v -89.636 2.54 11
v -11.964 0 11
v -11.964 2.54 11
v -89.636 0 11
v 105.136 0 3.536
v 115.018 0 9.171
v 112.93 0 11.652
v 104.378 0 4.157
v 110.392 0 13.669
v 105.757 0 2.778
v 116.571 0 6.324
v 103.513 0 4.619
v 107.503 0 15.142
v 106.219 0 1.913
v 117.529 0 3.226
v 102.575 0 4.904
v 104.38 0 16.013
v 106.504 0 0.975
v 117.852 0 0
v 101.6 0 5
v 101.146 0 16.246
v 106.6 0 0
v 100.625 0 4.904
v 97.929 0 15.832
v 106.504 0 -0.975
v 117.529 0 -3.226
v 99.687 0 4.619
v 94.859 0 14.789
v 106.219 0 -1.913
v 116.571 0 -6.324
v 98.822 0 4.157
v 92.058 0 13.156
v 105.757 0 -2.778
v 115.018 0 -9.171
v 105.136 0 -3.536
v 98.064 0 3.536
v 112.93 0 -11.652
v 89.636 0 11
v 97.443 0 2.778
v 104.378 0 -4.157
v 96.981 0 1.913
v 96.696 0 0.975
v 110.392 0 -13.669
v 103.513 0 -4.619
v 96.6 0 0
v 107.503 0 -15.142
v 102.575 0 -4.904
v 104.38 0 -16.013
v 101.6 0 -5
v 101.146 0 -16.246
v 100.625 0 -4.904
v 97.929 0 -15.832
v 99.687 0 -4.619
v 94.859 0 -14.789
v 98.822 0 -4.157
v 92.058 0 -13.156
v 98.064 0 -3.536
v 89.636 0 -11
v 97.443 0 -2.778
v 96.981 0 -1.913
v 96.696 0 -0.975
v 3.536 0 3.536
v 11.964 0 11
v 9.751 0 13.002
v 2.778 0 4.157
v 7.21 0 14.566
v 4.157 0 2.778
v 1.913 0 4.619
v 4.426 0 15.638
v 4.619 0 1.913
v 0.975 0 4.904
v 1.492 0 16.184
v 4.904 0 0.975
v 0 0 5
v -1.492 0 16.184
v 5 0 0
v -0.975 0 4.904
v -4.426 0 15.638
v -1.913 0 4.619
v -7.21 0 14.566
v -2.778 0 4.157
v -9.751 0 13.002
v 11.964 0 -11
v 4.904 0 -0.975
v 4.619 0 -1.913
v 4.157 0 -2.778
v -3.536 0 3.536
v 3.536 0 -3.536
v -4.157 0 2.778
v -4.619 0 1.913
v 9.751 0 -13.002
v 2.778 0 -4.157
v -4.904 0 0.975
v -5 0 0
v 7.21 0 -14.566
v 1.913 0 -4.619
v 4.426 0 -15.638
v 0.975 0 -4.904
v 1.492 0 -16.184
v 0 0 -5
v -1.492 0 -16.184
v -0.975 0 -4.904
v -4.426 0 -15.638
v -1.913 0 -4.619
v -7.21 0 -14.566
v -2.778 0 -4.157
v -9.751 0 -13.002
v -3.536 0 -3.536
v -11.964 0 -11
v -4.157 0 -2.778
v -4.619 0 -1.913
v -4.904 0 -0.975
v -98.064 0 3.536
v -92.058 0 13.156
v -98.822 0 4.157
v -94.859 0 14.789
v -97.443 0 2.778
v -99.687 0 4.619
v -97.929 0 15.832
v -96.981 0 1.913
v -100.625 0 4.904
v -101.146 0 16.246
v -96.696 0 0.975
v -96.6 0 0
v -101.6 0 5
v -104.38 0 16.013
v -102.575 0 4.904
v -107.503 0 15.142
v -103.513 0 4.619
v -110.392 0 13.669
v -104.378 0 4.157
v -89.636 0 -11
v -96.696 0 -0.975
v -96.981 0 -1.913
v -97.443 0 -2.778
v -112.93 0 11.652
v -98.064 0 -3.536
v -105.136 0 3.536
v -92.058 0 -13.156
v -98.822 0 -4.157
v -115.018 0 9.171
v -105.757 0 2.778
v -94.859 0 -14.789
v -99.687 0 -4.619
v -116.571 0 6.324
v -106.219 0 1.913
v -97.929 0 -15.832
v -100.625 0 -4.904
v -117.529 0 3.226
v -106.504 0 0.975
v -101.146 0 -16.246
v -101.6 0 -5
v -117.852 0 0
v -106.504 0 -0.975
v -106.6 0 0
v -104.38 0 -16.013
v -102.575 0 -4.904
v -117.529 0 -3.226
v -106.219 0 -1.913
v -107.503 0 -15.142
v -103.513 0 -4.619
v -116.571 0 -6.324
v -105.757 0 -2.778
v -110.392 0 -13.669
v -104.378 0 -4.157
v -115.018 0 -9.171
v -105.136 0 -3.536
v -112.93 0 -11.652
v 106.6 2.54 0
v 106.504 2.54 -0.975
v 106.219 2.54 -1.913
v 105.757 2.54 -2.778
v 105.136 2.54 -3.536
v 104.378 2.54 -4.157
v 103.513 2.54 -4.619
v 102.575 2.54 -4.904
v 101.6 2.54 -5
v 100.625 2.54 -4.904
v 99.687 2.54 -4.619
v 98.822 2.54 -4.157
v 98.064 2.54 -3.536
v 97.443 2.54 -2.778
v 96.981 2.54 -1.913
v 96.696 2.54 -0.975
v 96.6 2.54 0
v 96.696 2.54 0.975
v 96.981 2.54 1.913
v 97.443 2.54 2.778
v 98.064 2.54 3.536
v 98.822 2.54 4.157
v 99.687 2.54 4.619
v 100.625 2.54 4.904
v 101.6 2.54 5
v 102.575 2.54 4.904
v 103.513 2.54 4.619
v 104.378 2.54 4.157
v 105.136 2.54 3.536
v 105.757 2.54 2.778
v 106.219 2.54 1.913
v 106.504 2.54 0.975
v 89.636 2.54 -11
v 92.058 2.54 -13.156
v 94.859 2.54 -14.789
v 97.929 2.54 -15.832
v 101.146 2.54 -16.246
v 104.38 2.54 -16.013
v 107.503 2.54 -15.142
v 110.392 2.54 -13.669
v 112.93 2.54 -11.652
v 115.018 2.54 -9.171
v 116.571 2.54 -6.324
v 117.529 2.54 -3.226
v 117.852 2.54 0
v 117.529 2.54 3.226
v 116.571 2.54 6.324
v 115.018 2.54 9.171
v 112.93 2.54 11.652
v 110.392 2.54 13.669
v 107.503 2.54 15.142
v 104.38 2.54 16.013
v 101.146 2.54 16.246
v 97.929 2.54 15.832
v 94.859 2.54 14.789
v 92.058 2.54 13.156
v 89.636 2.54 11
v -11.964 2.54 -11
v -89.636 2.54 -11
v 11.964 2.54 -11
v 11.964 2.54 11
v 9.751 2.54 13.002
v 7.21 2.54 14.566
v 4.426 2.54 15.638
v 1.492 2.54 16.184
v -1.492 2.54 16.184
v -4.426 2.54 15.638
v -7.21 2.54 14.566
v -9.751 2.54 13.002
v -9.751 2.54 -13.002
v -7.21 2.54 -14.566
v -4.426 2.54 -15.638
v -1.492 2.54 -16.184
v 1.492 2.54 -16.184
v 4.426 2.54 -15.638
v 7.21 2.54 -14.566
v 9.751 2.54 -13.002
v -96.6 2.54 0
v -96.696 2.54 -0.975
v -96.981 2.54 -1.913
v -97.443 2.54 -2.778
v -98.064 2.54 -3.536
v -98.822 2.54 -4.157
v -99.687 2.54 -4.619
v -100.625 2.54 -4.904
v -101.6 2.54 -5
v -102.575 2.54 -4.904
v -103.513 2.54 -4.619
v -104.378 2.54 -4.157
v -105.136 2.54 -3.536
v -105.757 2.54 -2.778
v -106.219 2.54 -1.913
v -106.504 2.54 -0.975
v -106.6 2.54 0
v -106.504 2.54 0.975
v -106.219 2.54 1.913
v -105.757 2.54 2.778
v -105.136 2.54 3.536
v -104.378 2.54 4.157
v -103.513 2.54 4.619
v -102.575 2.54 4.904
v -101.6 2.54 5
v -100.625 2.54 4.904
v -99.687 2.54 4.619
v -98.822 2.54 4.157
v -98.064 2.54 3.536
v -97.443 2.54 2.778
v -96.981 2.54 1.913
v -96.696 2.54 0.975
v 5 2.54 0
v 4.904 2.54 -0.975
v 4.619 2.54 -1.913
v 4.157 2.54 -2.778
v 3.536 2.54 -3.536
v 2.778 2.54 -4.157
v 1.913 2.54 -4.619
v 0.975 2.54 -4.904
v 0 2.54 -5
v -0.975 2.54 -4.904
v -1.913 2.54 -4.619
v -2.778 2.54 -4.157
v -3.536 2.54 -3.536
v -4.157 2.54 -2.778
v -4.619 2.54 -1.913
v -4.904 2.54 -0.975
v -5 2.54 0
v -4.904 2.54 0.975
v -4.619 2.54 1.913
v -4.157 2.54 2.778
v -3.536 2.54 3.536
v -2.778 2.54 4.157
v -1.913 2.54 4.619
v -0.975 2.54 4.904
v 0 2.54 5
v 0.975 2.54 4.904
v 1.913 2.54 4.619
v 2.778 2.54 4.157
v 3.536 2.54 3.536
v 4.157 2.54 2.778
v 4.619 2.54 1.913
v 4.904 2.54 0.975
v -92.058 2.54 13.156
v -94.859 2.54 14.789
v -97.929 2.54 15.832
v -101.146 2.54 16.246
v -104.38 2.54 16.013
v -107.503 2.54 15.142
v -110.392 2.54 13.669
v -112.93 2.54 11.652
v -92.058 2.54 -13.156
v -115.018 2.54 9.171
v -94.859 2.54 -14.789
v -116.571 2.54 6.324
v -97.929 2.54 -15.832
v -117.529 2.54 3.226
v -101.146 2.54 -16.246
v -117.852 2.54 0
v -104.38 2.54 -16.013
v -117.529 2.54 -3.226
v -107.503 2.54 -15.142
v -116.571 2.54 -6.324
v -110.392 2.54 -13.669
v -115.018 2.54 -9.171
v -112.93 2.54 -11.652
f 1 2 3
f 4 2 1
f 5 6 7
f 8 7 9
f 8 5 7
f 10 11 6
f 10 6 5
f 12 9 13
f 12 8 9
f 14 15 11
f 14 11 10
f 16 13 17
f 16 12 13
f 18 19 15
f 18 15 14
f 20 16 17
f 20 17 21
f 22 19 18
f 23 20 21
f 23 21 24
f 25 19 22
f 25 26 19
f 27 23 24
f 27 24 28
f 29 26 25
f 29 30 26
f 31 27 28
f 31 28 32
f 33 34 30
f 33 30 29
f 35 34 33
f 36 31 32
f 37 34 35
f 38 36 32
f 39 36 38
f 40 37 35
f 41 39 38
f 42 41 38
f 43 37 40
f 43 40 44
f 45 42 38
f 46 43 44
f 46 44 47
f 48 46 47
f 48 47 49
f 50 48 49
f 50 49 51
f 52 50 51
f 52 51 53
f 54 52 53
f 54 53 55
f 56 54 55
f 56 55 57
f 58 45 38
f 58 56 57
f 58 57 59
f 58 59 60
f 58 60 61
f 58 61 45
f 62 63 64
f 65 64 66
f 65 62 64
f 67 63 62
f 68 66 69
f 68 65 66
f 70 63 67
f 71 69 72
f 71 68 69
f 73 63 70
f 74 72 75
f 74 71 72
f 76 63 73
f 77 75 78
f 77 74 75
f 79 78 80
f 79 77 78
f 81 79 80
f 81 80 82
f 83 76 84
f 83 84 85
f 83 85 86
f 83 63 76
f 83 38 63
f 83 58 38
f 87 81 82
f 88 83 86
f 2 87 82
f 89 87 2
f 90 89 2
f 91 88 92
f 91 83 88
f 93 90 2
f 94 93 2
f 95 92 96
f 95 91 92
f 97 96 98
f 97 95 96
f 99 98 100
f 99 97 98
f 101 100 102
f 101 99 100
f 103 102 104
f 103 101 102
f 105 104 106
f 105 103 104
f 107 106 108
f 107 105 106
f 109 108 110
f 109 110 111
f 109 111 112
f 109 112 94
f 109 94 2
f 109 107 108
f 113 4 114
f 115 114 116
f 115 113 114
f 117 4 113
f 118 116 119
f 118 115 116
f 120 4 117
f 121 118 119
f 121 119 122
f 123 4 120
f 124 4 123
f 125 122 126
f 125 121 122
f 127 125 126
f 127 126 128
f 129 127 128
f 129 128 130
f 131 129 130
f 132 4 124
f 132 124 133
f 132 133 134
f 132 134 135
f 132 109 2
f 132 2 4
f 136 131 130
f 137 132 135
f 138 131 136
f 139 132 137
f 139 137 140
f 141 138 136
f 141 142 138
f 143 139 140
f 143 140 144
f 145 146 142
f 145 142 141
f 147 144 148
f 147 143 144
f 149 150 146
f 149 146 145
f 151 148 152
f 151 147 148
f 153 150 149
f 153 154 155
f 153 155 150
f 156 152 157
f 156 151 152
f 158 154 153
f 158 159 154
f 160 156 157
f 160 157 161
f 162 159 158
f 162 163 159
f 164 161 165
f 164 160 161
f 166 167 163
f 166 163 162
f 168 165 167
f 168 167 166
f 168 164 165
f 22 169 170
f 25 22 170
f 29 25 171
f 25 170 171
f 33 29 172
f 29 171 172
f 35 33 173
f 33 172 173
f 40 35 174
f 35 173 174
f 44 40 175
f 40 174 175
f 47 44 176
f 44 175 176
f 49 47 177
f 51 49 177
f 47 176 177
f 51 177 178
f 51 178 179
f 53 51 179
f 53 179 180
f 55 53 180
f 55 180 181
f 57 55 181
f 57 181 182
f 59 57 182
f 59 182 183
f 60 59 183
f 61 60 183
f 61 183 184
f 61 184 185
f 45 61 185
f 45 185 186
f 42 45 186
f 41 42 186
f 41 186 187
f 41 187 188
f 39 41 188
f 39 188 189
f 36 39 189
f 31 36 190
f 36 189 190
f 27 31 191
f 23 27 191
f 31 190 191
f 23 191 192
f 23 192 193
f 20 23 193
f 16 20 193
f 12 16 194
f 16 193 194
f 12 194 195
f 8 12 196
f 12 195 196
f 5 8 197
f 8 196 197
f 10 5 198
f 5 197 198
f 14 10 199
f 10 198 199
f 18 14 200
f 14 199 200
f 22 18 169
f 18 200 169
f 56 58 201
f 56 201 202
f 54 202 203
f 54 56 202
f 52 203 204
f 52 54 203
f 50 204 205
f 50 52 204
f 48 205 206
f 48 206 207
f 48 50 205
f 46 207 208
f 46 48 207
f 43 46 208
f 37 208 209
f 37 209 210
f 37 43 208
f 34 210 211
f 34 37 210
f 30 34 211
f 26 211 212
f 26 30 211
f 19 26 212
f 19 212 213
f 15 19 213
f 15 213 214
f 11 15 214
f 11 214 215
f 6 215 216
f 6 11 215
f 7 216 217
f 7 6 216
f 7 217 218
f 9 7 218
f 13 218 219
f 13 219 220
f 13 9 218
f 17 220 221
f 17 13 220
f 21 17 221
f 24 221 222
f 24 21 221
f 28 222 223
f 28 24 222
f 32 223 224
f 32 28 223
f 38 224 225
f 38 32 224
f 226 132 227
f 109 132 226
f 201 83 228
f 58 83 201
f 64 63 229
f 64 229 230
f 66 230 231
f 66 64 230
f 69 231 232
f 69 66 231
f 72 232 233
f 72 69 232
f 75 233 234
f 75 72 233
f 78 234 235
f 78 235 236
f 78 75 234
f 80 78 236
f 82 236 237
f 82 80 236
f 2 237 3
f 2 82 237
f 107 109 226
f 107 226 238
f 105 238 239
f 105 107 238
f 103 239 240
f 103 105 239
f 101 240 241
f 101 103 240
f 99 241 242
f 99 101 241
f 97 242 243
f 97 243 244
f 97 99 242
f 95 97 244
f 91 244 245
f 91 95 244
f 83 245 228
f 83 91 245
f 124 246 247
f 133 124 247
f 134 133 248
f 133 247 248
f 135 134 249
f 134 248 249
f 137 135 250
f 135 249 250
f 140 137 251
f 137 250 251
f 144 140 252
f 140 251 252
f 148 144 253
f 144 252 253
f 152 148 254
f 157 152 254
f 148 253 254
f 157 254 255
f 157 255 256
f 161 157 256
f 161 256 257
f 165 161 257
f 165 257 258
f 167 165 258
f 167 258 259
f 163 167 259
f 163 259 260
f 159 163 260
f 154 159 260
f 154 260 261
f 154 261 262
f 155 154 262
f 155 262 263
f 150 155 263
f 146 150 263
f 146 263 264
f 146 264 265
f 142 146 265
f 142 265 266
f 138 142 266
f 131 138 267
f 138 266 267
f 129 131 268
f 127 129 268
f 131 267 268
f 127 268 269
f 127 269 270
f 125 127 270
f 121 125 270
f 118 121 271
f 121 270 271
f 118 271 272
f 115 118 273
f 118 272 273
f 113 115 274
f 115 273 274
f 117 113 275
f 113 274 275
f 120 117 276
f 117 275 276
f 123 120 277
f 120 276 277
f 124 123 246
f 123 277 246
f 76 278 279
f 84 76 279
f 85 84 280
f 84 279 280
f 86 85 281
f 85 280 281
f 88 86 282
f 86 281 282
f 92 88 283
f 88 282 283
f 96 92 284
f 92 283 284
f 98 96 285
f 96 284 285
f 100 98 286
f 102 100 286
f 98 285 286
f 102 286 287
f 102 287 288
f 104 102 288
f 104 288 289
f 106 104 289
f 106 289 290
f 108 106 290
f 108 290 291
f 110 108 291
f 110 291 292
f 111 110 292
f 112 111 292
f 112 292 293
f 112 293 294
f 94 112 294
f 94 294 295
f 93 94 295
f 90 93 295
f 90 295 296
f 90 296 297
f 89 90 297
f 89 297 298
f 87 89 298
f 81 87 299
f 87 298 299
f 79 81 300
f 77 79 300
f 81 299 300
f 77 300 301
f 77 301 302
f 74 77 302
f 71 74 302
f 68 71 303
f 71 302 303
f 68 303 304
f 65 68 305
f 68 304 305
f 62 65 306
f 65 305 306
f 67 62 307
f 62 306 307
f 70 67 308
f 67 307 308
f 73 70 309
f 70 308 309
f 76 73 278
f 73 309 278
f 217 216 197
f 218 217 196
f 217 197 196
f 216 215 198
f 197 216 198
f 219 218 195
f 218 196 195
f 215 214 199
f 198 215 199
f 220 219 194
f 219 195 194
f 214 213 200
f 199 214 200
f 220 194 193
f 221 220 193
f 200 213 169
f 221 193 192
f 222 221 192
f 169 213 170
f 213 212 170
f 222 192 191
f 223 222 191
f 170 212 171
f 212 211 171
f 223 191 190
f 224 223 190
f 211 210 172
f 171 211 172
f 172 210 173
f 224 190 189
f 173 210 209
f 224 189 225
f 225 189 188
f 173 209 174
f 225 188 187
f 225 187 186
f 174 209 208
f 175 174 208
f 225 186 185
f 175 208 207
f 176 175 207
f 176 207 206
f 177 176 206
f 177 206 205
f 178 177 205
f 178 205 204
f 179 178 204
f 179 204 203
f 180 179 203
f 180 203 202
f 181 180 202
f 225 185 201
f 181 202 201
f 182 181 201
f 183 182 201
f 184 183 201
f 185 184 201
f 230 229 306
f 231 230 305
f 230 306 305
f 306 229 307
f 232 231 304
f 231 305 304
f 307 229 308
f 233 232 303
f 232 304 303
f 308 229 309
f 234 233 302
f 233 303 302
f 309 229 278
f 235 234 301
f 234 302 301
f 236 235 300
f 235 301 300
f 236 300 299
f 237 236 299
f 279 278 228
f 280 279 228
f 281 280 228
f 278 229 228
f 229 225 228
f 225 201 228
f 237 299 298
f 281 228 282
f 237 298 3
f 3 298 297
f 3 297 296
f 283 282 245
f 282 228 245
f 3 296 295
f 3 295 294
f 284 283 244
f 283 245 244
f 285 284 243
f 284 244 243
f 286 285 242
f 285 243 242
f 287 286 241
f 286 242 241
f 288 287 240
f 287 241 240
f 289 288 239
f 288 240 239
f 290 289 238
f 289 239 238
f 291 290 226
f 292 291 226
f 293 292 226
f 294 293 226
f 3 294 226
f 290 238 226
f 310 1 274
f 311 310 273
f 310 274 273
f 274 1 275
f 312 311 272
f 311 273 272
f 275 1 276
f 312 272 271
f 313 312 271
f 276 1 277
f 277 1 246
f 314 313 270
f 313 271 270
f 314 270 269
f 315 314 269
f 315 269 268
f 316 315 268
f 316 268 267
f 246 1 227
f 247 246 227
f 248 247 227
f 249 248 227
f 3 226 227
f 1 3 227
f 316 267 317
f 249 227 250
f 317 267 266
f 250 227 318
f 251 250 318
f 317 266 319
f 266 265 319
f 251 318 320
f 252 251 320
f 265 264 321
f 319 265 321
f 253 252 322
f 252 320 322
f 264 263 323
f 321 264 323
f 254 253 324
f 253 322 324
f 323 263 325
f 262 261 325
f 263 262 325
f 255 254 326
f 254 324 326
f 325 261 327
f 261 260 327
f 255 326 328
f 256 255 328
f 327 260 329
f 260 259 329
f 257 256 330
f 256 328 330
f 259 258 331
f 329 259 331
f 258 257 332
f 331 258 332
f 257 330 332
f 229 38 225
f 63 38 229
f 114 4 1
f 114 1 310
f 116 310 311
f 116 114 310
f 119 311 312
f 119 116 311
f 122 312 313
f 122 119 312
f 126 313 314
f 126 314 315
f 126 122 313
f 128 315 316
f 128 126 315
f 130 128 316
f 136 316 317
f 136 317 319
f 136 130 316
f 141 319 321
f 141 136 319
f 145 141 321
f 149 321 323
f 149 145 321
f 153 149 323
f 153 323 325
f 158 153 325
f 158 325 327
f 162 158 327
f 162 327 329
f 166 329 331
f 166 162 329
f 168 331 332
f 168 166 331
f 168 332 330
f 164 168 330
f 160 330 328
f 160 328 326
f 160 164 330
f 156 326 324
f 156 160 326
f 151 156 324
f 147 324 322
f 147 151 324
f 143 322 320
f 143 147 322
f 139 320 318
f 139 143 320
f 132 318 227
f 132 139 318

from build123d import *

# Parameters (mm, degrees)
BOSS_EXTRUDE1_DEPTH     = 2.54
SKETCH2_R               = 5
CUT_EXTRUDE1_DEPTH      = 1
CUT_EXTRUDE1_DEPTH_BACK = 3.54


with BuildPart() as part:
    # Sketch1 → Boss-Extrude1 (new body)
    with BuildSketch(Plane(origin=(0, 0, 0), x_dir=(1, 0, 0), z_dir=(0, 1, 0))):
        with BuildLine():
            Line((-89.636017598, 11), (-11.963982402, 11))
            ThreePointArc((-11.963982402, 11), (0, 16.252288298), (11.963982402, 11))
            Line((11.963982402, 11), (89.636017598, 11))
            ThreePointArc((89.636017598, 11), (117.852288298, 0), (89.636017598, -11))
            Line((89.636017598, -11), (11.963982402, -11))
            ThreePointArc((11.963982402, -11), (0, -16.252288298), (-11.963982402, -11))
            Line((-11.963982402, -11), (-89.636017598, -11))
            ThreePointArc((-89.636017598, -11), (-117.852288298, 0), (-89.636017598, 11))
        make_face()
    extrude(amount=BOSS_EXTRUDE1_DEPTH)

    # Sketch2 → Cut-Extrude1 (cut, two sides)
    with BuildSketch(Plane(origin=(0, 2.54, 0), x_dir=(1, 0, 0), z_dir=(0, 1, 0))) as cut_extrude1_sk:
        with Locations((-101.6, 0)):
            Circle(SKETCH2_R)
        with Locations((101.6, 0)):
            Circle(SKETCH2_R)
        Circle(SKETCH2_R)
    extrude(amount=CUT_EXTRUDE1_DEPTH, mode=Mode.SUBTRACT)
    extrude(cut_extrude1_sk.sketch, amount=-CUT_EXTRUDE1_DEPTH_BACK, mode=Mode.SUBTRACT)


solid = part.part
